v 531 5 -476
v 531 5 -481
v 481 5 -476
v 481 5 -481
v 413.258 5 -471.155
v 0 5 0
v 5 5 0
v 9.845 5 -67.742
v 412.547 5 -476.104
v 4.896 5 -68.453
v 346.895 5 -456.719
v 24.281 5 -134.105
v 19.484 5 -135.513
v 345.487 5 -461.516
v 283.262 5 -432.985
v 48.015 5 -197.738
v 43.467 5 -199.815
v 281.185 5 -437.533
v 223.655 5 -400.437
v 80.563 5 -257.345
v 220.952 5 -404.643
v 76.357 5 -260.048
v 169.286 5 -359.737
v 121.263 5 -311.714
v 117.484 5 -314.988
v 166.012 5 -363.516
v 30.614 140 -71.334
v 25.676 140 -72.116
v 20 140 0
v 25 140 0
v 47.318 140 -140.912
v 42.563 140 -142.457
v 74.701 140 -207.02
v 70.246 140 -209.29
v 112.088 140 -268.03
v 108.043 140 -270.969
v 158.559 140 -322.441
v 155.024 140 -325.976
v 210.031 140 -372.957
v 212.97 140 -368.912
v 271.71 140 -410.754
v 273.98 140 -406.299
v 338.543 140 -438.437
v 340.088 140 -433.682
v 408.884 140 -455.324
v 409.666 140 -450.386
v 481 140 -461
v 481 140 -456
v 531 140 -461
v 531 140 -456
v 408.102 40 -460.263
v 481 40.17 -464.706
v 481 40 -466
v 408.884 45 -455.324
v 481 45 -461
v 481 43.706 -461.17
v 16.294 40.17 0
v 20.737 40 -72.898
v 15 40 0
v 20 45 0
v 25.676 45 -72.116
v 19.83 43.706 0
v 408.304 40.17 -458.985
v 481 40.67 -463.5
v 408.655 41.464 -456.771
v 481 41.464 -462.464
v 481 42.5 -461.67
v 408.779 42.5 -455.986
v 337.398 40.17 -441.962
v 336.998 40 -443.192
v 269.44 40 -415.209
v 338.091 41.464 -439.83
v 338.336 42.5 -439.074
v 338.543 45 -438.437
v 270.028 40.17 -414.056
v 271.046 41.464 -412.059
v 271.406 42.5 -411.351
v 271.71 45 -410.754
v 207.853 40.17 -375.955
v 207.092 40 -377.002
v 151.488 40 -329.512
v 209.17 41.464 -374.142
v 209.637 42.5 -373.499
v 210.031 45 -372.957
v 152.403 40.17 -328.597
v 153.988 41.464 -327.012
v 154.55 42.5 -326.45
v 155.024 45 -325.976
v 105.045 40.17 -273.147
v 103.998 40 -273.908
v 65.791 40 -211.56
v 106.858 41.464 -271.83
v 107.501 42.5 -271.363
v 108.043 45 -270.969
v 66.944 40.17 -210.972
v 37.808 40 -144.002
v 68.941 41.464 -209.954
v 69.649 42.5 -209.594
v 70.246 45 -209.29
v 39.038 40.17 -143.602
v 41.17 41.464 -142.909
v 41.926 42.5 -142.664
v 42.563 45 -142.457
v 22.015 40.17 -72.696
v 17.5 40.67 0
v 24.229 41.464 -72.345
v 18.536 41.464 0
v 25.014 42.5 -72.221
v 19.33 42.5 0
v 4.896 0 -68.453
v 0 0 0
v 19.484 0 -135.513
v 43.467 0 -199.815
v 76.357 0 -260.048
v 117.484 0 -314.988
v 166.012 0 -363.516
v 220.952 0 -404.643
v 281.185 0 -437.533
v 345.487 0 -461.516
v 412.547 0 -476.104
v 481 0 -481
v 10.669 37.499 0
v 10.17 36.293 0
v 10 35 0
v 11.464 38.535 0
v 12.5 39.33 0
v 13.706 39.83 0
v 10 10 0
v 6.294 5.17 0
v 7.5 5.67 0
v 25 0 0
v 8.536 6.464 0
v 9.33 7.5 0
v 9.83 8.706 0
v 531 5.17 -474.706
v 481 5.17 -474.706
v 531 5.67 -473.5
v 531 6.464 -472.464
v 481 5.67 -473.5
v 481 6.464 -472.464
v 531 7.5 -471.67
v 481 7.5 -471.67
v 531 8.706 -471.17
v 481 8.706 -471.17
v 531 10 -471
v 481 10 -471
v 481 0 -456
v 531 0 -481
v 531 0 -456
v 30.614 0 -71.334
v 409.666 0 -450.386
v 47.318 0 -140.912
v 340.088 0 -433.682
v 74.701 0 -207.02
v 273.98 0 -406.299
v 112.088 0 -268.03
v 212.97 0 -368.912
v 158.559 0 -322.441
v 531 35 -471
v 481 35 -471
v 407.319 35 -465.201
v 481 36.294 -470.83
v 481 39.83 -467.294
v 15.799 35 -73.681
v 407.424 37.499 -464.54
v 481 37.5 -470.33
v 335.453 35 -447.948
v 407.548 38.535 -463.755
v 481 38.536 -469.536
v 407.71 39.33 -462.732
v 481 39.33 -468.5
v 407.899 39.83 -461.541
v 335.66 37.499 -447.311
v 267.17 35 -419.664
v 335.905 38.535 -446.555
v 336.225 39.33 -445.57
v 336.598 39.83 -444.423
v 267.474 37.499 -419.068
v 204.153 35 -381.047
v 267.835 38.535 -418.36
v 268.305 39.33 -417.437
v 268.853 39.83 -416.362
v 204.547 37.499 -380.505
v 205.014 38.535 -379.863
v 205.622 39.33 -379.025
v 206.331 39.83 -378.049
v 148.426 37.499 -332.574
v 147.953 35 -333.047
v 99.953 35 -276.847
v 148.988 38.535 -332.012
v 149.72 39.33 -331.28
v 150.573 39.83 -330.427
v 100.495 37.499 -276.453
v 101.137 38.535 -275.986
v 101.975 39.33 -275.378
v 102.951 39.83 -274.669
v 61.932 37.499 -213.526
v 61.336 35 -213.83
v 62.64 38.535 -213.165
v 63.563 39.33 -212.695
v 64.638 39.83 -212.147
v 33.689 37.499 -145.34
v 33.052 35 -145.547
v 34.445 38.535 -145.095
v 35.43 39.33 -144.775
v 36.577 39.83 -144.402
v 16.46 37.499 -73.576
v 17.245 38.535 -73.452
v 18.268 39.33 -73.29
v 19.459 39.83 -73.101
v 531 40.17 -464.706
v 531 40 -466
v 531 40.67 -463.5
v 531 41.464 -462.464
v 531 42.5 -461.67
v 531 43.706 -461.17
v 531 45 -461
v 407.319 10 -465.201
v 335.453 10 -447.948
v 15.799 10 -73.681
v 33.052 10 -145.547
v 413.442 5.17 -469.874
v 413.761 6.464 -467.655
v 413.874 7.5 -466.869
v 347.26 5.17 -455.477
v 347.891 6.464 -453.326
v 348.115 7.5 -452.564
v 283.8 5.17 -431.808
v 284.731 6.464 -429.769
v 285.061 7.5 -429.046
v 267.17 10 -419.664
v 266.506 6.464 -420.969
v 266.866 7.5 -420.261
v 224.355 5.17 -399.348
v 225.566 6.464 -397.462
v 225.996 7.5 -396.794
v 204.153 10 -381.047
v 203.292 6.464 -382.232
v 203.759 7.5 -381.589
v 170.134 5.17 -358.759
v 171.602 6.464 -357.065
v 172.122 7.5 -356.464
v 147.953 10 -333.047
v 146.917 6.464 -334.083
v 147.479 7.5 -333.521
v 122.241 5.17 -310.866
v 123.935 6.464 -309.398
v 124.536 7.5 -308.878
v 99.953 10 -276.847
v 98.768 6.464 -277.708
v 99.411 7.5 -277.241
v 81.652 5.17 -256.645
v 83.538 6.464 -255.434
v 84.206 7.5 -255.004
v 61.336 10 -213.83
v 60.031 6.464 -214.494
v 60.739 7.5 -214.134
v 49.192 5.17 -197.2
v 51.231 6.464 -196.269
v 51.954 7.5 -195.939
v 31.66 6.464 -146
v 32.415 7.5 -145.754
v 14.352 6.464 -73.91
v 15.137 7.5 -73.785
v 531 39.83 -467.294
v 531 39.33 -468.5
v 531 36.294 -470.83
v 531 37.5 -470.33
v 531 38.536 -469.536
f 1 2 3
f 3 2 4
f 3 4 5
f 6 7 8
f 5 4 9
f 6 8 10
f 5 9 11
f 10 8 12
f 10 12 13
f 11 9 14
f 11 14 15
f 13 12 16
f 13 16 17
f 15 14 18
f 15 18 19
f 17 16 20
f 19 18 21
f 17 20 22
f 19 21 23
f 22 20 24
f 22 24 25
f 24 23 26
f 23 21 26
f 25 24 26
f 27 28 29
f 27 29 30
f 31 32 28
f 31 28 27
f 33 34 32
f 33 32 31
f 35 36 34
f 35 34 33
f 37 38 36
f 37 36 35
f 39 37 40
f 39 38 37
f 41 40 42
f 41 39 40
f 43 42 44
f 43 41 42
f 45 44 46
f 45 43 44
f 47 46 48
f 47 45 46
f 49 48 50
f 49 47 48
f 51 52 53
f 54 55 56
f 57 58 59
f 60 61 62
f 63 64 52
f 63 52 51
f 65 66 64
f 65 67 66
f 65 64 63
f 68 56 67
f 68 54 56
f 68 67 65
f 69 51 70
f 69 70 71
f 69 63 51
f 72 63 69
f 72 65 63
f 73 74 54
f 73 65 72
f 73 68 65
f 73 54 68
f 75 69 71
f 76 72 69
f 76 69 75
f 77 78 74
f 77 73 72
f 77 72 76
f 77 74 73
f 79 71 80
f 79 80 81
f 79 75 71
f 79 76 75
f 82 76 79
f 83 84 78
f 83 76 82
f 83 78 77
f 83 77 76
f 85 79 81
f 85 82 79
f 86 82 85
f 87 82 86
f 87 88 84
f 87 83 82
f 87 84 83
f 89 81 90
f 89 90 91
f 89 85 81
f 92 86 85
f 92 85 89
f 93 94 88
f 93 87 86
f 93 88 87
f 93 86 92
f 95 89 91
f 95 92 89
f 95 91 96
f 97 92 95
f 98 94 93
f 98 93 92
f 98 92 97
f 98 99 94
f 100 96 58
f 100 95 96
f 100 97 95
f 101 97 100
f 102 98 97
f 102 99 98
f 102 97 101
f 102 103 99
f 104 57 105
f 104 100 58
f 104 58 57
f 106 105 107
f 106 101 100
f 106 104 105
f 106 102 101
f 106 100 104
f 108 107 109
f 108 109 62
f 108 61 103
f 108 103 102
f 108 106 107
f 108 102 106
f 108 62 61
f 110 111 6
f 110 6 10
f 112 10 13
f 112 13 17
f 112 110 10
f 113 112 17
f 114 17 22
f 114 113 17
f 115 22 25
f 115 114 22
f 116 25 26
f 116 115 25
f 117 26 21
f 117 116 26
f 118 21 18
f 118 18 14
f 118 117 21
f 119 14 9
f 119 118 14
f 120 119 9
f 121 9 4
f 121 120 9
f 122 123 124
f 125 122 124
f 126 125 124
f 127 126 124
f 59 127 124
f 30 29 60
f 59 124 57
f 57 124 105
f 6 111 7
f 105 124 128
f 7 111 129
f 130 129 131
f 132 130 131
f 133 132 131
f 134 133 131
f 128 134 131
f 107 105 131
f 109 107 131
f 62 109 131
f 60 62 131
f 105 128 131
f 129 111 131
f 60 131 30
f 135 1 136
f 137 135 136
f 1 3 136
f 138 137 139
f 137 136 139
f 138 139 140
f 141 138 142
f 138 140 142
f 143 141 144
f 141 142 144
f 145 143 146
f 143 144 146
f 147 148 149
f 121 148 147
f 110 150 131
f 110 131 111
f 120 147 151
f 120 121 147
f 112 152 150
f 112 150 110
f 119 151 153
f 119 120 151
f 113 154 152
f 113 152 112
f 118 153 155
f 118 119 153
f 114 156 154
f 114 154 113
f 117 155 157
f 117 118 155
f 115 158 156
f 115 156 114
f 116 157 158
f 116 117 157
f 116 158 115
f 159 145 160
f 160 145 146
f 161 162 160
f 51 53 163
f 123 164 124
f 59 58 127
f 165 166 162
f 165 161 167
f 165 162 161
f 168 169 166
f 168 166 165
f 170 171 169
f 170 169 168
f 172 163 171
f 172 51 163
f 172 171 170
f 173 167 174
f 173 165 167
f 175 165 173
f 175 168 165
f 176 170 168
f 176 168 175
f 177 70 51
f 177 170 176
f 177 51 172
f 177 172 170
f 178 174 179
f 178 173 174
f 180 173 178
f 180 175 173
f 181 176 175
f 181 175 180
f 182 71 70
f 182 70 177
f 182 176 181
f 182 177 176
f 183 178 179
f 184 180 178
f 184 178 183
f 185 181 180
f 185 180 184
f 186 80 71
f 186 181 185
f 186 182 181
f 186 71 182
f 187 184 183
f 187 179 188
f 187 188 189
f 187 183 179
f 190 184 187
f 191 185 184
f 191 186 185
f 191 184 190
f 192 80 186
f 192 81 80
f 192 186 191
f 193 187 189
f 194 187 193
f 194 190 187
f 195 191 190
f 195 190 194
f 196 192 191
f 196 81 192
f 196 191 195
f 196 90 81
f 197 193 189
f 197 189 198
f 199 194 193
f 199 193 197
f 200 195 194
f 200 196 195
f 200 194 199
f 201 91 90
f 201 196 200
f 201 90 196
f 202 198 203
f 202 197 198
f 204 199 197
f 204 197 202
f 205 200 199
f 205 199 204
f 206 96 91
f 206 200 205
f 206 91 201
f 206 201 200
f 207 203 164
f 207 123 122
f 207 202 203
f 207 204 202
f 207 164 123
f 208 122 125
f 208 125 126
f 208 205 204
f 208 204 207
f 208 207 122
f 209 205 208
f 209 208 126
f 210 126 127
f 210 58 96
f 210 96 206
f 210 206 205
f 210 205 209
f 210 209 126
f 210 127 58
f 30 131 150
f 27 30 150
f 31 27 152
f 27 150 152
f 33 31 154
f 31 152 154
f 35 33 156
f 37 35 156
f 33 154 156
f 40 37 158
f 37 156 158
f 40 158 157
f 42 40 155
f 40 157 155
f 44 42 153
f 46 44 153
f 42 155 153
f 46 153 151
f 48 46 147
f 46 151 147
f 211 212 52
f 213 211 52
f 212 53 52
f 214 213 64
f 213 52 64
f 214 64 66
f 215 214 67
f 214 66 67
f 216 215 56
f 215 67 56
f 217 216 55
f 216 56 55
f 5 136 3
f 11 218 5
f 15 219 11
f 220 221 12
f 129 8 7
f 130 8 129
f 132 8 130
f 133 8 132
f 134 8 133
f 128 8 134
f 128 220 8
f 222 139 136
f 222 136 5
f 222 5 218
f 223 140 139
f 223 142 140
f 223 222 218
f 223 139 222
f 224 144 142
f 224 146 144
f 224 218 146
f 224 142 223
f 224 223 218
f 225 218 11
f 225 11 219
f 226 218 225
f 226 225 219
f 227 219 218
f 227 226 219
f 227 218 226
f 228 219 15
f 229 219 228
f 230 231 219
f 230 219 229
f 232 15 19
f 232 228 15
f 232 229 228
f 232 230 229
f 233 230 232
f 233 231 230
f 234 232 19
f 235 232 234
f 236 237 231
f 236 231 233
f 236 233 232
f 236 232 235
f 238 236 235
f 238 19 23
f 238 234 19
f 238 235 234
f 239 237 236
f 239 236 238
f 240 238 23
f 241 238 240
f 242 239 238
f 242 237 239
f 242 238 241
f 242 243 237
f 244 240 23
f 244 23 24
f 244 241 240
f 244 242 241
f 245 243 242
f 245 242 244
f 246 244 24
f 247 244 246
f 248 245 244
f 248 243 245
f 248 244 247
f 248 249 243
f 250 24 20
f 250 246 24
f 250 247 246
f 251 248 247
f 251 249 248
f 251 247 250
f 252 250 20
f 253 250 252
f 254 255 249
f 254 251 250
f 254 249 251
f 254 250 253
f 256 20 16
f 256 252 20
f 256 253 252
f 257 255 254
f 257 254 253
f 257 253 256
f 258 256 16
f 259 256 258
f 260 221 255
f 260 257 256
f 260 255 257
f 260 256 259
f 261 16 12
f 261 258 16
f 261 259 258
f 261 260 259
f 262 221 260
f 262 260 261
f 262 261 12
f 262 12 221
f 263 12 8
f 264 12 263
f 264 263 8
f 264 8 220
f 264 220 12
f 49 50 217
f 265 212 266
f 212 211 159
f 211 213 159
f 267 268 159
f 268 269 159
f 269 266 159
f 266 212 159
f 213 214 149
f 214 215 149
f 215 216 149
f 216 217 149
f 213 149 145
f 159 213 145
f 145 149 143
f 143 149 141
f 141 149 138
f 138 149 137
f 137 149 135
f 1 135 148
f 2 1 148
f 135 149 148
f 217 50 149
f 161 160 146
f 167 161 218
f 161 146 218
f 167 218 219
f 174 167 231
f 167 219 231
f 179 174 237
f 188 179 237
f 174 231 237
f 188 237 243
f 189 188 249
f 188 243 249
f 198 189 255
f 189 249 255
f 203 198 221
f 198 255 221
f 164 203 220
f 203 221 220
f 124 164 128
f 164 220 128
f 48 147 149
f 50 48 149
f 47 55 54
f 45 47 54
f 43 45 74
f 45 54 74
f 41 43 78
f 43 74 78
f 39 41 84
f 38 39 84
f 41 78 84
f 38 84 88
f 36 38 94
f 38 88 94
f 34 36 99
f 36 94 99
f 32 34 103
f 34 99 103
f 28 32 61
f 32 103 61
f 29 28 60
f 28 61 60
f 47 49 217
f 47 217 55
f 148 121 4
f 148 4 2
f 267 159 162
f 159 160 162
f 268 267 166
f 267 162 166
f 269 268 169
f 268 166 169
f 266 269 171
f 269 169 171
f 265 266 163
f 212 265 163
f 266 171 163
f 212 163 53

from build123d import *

# Parameters (mm, degrees)
BOTTOM_LEVEL_DEPTH = 5
MID_LEVEL_DEPTH    = 35
GUARD_RAIL_DEPTH   = 100
ROUNDING_R         = 5


with BuildPart() as part:
    # Sketch1 → Bottom level (new body)
    with BuildSketch(Plane(origin=(0, 0, 0), x_dir=(1, 0, 0), z_dir=(0, 1, 0))):
        with BuildLine():
            Line((481, 481), (531, 481))
            Line((531, 481), (531, 456))
            Line((531, 456), (481, 456))
            ThreePointArc((481, 456), (158.559307779, 322.440692221), (25, 0))
            Line((25, 0), (0, 0))
            ThreePointArc((0, 0), (140.881638249, 340.118361751), (481, 481))
        make_face()
    extrude(amount=BOTTOM_LEVEL_DEPTH)

    # Sketch2 → Mid level (add)
    with BuildSketch(Plane(origin=(0, 5, 0), x_dir=(1, 0, 0), z_dir=(0, 1, 0))):
        with BuildLine():
            Line((481, 456), (531, 456))
            Line((531, 456), (531, 471))
            Line((531, 471), (481, 471))
            ThreePointArc((481, 471), (147.952706061, 333.047293939), (10, 0))
            Line((10, 0), (25, 0))
            ThreePointArc((25, 0), (158.559307779, 322.440692221), (481, 456))
        make_face()
    extrude(amount=MID_LEVEL_DEPTH)

    # Sketch3 → Guard rail (add)
    with BuildSketch(Plane(origin=(0, 40, 0), x_dir=(1, 0, 0), z_dir=(0, 1, 0))):
        with BuildLine():
            Line((481, 456), (531, 456))
            Line((531, 456), (531, 461))
            Line((531, 461), (481, 461))
            ThreePointArc((481, 461), (155.023773873, 325.976226127), (20, 0))
            Line((20, 0), (25, 0))
            ThreePointArc((25, 0), (158.559307779, 322.440692221), (481, 456))
        make_face()
    extrude(amount=GUARD_RAIL_DEPTH)

    # Rounding
    rounding_edges = [part.edges().sort_by_distance(p)[0] for p in [
        (506, 40, -461),
        (506, 40, -471),
        (506, 5, -471),
        (155.023773873, 40, -325.976226127),
        (147.952706061, 40, -333.047293939),
        (147.952706061, 5, -333.047293939),
    ]]
    fillet(rounding_edges, radius=ROUNDING_R - 0.0001)  # a hair under: the kernel refuses the full size


solid = part.part
